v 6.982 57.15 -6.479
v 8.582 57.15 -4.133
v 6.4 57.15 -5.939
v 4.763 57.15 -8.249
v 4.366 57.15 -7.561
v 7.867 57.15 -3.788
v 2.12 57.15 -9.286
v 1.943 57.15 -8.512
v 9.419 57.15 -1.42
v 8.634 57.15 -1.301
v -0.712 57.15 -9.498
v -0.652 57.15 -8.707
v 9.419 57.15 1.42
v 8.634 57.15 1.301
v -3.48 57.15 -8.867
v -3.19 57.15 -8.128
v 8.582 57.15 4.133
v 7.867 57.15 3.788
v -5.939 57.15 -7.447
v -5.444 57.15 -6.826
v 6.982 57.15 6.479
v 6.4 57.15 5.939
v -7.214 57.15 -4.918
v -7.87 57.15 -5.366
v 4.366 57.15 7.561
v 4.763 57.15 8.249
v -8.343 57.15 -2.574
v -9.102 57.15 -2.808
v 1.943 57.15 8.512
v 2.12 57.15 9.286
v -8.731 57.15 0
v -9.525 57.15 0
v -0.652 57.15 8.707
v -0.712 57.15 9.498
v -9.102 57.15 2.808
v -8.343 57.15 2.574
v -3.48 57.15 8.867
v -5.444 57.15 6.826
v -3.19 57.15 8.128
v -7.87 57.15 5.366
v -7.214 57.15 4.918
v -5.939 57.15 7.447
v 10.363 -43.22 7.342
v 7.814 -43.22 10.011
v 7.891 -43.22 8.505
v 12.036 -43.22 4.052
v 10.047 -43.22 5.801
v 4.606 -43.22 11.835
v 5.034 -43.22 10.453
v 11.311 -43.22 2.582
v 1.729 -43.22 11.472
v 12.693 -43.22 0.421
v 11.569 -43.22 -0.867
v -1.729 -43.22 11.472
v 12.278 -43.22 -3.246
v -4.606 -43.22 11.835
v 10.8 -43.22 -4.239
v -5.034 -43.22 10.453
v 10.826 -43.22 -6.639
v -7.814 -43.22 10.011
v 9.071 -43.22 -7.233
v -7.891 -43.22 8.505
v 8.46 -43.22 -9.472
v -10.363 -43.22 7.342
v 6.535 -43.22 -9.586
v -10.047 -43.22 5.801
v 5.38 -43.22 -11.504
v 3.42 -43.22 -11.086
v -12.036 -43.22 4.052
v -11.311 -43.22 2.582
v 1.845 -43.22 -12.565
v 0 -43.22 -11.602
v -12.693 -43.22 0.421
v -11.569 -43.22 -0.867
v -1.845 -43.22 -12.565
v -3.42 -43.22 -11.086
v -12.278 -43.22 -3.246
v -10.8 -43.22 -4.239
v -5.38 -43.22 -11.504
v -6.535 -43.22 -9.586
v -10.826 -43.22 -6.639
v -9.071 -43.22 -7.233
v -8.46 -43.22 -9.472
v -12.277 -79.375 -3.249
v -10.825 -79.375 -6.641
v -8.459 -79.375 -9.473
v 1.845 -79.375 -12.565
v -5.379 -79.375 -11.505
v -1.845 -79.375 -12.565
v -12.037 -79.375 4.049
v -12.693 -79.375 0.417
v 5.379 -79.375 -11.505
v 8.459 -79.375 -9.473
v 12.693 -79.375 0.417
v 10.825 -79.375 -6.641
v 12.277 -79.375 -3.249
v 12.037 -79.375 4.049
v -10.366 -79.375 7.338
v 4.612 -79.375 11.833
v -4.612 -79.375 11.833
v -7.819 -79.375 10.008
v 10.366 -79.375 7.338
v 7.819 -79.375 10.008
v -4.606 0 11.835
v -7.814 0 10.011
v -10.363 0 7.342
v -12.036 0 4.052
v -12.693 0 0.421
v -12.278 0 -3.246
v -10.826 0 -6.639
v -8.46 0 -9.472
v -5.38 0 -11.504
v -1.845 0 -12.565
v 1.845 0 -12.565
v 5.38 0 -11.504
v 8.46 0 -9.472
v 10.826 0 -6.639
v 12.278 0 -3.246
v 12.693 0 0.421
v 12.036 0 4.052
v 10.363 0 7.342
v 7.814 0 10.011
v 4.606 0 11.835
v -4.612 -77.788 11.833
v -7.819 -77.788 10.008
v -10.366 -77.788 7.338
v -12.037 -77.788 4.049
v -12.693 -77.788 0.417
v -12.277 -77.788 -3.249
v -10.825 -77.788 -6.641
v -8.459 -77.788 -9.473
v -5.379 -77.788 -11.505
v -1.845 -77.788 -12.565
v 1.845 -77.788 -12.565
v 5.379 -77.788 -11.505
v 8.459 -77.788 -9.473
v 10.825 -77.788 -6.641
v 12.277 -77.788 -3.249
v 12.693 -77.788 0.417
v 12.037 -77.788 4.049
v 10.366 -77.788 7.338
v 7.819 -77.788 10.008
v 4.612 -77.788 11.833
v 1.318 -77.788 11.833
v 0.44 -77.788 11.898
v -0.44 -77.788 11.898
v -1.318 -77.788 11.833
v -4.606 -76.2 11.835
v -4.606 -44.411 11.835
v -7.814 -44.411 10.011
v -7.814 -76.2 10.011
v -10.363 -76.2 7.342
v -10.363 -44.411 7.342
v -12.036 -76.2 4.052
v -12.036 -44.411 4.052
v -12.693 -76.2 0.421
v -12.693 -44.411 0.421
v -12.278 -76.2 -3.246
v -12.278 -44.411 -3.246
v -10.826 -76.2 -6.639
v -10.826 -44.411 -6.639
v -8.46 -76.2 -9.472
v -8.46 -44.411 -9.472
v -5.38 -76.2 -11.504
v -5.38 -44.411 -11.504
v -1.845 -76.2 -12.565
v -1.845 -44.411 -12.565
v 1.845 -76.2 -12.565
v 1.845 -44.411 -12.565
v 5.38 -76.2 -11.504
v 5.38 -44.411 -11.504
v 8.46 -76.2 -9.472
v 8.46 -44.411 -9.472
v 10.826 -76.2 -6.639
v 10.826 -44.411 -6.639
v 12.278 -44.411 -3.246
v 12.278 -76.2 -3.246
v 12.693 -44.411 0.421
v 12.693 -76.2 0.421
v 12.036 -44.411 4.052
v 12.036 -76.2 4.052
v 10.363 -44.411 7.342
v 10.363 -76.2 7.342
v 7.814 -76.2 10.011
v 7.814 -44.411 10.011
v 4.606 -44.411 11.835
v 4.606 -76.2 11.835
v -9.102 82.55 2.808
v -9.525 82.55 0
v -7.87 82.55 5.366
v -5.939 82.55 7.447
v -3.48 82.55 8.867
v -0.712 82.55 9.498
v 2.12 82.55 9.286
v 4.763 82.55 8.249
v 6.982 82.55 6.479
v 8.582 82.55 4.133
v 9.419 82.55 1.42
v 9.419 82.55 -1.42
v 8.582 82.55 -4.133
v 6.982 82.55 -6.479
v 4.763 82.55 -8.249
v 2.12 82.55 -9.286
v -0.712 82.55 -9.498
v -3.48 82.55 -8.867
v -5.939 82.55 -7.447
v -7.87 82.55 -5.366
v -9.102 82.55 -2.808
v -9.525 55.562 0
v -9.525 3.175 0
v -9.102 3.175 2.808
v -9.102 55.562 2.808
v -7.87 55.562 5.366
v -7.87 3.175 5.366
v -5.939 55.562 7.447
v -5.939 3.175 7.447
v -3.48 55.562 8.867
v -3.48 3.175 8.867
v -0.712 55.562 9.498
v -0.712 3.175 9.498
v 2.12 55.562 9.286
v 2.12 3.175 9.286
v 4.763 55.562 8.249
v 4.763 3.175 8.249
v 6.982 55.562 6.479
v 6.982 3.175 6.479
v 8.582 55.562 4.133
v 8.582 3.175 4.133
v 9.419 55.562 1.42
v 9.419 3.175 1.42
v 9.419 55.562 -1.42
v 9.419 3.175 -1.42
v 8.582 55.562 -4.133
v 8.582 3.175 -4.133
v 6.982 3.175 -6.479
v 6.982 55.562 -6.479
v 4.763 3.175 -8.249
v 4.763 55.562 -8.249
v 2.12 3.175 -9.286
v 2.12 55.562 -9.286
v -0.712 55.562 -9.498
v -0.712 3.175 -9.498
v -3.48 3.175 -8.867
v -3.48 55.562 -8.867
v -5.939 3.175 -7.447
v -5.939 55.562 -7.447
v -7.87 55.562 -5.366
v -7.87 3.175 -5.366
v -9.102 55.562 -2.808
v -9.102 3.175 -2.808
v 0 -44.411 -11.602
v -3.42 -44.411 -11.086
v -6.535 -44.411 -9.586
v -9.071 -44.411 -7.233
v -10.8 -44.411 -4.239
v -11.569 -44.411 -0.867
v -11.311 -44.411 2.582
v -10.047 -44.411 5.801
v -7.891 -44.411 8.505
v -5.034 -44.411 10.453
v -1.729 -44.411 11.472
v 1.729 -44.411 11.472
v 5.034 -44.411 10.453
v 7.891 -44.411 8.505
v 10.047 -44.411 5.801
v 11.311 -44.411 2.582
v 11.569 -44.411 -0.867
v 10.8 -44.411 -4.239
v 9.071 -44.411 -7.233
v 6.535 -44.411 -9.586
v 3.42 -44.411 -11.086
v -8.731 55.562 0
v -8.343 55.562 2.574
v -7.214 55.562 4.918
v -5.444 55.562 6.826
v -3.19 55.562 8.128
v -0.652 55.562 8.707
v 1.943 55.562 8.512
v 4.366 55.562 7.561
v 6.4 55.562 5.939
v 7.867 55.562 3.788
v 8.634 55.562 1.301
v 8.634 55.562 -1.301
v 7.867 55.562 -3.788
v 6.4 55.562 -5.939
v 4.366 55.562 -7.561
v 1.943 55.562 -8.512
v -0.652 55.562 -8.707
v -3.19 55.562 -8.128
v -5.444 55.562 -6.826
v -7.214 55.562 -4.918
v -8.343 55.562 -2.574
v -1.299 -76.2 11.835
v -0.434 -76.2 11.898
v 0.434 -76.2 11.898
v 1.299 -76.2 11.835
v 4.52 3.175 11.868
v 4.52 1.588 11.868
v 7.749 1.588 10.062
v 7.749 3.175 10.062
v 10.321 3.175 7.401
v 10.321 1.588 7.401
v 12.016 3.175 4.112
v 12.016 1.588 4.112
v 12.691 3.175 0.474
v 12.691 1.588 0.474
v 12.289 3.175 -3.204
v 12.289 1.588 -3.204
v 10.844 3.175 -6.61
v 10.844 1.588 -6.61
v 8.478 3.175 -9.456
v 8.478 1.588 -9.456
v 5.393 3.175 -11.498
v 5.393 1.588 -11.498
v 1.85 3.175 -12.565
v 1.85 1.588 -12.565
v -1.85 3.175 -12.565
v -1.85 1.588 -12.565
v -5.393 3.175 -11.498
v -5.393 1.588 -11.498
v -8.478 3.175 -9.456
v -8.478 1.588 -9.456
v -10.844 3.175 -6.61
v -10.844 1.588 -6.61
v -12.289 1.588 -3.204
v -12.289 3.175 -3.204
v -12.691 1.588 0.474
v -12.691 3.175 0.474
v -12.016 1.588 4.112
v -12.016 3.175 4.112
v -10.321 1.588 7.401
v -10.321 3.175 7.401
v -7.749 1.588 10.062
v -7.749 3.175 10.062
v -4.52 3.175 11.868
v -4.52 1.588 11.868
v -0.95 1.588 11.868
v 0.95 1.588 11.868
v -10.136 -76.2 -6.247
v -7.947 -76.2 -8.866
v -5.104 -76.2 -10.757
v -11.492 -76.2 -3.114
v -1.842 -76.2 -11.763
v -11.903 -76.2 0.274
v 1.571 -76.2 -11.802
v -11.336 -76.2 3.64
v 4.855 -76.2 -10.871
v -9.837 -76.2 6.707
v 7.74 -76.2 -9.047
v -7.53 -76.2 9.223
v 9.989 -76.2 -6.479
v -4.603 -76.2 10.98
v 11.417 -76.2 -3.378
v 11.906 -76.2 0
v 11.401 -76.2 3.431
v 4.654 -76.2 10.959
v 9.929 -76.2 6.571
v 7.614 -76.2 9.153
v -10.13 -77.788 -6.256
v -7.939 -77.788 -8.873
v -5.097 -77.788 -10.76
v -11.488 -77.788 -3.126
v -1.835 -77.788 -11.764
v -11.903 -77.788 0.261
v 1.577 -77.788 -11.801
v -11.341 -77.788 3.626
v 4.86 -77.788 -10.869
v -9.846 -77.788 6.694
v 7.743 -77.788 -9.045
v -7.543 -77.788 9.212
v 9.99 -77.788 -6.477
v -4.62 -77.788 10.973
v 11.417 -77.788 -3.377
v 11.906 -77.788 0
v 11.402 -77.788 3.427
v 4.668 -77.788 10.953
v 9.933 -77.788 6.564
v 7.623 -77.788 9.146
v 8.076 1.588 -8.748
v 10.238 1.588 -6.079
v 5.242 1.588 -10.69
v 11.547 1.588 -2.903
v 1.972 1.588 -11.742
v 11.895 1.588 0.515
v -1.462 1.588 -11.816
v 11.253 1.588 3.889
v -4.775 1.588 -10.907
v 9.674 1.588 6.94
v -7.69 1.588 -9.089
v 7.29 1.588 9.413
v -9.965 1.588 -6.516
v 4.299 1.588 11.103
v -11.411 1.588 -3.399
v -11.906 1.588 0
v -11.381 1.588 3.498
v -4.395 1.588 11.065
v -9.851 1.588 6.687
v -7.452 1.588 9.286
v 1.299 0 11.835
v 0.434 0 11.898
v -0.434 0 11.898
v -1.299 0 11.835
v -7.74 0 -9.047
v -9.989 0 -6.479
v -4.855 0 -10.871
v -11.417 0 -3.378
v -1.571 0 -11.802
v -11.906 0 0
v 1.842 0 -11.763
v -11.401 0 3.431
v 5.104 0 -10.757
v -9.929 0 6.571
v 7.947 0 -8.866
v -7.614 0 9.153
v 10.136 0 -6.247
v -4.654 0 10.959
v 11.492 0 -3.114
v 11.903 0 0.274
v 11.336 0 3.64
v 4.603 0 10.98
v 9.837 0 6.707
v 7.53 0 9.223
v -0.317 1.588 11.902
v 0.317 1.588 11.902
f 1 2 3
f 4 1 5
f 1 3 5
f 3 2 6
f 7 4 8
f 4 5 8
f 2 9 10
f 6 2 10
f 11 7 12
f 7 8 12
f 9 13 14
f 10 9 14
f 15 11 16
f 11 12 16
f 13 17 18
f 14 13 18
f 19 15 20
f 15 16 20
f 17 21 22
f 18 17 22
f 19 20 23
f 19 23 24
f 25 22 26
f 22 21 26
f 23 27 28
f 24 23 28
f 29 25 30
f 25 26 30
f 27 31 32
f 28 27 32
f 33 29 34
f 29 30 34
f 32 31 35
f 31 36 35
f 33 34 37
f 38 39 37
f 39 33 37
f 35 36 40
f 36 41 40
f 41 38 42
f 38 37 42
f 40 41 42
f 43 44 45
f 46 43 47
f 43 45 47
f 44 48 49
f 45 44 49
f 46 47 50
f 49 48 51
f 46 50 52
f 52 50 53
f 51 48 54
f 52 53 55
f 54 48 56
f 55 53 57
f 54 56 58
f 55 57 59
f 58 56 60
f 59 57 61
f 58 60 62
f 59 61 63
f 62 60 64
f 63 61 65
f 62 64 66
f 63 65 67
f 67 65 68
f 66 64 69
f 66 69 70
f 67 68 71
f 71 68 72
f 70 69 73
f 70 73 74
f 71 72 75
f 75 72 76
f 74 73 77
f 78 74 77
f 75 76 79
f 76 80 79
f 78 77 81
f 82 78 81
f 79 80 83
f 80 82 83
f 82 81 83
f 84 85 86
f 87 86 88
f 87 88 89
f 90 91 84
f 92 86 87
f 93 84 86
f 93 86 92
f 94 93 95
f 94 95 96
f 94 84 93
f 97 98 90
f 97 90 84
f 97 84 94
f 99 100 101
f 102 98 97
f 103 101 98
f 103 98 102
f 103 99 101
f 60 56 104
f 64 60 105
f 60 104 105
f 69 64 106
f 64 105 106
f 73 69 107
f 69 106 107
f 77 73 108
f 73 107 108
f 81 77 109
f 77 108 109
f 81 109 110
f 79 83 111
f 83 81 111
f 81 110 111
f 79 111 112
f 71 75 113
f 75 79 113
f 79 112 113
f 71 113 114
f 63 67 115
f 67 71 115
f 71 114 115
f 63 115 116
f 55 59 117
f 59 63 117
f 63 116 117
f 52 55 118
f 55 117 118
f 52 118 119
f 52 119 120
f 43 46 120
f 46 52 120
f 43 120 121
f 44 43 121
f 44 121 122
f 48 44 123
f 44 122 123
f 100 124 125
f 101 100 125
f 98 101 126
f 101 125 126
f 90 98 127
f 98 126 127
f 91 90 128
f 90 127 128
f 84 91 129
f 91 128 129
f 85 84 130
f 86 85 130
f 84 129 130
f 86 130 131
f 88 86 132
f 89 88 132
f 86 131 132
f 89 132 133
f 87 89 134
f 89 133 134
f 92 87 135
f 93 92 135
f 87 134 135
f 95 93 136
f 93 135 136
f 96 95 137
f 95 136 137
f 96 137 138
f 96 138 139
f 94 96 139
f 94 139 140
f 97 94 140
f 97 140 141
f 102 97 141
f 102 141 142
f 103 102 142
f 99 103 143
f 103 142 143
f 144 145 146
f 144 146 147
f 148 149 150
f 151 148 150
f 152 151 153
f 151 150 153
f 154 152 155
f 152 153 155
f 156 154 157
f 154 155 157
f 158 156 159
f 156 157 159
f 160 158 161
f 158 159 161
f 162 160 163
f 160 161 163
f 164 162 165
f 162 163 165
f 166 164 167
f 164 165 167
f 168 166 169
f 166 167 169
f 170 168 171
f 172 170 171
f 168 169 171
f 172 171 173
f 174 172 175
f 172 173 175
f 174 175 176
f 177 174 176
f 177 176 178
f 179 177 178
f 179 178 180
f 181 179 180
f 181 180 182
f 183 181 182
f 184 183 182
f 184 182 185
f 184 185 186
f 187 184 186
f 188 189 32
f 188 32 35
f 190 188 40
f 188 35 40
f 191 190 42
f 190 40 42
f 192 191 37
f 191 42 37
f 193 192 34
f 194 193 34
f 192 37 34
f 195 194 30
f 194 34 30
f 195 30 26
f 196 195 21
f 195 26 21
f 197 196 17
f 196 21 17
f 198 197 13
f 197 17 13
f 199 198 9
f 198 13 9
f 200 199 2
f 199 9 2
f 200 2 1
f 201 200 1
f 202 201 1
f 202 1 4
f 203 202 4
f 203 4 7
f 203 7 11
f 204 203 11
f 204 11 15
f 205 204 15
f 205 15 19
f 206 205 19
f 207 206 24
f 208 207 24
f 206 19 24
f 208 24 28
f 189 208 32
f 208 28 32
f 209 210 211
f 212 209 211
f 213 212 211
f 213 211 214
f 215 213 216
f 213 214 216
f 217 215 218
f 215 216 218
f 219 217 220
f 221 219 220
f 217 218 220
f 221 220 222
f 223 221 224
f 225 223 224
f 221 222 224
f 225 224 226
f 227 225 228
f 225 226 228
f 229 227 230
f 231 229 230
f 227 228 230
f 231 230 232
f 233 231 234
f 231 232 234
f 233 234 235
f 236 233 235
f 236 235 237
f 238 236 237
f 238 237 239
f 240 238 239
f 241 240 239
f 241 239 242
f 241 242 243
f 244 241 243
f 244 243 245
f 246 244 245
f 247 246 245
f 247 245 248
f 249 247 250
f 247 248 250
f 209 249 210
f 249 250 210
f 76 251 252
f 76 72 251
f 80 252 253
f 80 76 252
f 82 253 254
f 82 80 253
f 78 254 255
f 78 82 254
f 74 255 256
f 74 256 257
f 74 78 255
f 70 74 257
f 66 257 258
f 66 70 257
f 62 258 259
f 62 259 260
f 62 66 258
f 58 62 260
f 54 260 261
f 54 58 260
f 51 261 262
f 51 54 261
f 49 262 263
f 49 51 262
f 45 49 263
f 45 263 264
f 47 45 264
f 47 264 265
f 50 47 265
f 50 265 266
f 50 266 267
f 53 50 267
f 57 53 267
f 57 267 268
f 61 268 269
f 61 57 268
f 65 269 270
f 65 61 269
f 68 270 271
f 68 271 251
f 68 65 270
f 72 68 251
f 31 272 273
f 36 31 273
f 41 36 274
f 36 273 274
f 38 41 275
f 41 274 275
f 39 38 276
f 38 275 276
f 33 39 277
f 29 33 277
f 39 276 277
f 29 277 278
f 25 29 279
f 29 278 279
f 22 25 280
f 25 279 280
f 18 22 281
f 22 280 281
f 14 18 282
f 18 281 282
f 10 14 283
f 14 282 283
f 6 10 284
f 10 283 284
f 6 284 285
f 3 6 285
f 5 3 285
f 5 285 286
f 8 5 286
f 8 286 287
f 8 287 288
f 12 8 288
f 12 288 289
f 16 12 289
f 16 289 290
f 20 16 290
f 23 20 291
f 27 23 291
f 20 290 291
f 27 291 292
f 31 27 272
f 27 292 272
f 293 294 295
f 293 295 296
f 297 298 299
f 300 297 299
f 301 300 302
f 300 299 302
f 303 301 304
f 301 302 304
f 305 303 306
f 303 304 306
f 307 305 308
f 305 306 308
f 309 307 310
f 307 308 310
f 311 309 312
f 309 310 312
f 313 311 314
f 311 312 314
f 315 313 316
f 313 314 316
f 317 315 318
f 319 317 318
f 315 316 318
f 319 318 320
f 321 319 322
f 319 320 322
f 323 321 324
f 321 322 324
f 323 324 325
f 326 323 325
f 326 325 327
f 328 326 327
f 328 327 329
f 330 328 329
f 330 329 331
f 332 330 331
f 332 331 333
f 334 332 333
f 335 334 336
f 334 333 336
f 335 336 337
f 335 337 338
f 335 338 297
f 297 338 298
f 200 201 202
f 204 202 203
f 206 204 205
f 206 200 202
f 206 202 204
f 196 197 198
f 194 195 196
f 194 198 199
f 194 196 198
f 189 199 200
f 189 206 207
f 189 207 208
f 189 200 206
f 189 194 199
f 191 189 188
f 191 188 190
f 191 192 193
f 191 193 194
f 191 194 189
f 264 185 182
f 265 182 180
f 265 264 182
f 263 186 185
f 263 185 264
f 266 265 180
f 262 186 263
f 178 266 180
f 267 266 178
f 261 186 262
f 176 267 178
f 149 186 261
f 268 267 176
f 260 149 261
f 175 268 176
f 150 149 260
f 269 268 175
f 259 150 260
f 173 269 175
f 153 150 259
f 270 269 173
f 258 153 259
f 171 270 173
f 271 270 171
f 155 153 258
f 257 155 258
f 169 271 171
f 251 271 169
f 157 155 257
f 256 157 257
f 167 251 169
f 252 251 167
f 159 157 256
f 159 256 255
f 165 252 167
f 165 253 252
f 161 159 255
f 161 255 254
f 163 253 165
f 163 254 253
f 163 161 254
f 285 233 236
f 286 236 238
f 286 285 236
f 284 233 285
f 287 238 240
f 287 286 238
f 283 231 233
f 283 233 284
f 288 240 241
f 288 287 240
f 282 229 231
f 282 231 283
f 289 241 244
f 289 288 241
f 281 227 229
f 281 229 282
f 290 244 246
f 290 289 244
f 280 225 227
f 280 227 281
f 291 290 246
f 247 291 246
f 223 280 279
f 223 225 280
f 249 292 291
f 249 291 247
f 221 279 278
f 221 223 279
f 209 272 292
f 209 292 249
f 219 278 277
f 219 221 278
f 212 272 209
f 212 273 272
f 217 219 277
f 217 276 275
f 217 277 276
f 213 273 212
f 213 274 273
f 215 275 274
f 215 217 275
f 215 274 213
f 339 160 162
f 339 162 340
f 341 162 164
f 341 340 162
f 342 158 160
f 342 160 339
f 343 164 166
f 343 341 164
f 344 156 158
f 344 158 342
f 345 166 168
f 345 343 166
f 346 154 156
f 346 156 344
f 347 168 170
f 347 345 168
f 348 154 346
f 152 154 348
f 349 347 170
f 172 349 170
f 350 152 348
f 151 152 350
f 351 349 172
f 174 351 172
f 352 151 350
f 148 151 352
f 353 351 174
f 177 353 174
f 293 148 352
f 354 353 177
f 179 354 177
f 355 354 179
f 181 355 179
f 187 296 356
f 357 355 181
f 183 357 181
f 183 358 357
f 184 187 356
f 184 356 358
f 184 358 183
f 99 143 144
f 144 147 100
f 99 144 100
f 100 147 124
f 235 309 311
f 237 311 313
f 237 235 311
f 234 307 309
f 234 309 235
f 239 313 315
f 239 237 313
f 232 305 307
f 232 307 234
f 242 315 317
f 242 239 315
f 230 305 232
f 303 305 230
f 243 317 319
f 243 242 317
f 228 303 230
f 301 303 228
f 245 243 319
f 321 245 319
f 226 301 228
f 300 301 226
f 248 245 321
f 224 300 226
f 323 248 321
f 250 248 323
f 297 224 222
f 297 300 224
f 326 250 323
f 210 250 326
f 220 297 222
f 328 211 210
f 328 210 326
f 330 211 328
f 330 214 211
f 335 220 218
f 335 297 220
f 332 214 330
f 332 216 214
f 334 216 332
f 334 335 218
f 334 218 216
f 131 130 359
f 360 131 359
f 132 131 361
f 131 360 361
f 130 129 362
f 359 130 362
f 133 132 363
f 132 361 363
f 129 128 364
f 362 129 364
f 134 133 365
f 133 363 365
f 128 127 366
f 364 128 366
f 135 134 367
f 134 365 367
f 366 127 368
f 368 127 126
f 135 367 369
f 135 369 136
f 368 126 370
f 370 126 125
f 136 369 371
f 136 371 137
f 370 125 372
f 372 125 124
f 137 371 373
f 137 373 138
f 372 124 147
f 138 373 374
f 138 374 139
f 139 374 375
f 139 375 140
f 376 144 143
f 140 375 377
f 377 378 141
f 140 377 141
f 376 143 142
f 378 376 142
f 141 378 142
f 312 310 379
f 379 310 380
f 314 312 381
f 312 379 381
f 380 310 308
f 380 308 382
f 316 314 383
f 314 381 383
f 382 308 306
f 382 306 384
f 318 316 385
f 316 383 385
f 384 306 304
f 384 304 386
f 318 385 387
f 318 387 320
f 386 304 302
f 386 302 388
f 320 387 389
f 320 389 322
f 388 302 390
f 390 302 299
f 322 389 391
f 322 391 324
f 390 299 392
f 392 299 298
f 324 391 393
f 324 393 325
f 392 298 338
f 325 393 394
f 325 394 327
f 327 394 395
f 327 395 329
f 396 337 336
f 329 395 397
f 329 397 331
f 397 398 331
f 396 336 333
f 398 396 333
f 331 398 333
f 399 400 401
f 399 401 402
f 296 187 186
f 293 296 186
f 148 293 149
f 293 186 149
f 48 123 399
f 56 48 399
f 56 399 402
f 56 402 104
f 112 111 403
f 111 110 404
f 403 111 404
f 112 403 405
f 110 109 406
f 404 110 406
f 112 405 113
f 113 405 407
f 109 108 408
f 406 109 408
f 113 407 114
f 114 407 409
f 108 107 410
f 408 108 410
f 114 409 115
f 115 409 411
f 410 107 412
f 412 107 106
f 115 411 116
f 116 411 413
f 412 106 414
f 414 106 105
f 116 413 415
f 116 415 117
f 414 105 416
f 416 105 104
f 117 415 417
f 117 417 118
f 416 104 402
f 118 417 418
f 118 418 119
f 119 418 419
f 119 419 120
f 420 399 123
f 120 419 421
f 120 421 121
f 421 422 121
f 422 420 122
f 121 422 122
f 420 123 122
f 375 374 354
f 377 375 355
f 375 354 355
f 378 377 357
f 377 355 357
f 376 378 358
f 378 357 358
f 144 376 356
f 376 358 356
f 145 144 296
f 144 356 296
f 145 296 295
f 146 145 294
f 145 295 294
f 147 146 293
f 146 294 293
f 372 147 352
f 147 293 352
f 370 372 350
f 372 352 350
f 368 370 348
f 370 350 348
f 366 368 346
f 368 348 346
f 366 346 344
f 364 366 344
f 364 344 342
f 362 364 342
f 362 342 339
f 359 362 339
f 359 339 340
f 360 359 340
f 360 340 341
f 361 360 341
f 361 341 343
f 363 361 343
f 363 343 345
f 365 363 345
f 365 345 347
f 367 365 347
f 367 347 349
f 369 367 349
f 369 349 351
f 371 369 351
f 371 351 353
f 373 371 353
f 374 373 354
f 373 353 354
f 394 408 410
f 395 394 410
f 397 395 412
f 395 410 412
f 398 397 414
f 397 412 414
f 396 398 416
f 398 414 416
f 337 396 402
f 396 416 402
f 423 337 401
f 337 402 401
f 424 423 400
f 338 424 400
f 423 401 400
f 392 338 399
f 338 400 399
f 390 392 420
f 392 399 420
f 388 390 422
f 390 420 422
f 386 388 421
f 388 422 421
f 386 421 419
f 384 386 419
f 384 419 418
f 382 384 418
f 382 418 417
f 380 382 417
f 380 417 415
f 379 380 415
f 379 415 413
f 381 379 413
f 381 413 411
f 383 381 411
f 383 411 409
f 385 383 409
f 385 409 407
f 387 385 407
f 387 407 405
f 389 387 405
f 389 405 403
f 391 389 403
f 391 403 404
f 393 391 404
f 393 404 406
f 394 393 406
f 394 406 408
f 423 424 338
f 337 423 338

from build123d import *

# Parameters (mm, degrees)
F1_DEPTH  = 76.2
F2_R      = 11.90625
F3_DEPTH  = 1.5875
F5_DEPTH  = 1.5875
F6_R      = 11.90625
F7_DEPTH  = 1.5875
F9_DEPTH  = 1.5875
F10_R     = 9.525
F11_DEPTH = 52.3875
F12_R     = 8.73125
F13_DEPTH = 1.5875
F14_R     = 9.525
F15_DEPTH = 25.4
F16_W     = 1.190625
F16_H     = 1.190625


with BuildPart() as f1:
    # F0 (on Front) → F1 (new body)
    with BuildSketch(Plane.XZ):
        with BuildLine():
            Line((4.6062404769, 11.83522491), (-4.6062404769, 11.83522491))
            ThreePointArc((-4.6062404769, 11.83522491), (0, -12.7), (4.6062404769, 11.83522491))
        make_face()
    extrude(amount=F1_DEPTH)

    # F2 (on face) → F3 (join)
    with BuildSketch(Plane.XZ.offset(76.2)):
        Circle(F2_R)
    extrude(amount=F3_DEPTH)

    # F4 (on face) → F5 (join)
    with BuildSketch(Plane.XZ.offset(77.7875)):
        with BuildLine():
            Line((4.6117921338, 11.8330627191), (-4.6117921338, 11.8330627191))
            ThreePointArc((-4.6117921338, 11.8330627191), (0, -12.7), (4.6117921338, 11.8330627191))
        make_face()
    extrude(amount=F5_DEPTH)

    # F6 (on face) → F7 (join)
    with BuildSketch(Plane(origin=(0, 0, 0), x_dir=(-1, 0, 0), z_dir=(0, 1, 0))):
        Circle(F6_R)
    extrude(amount=F7_DEPTH)

    # F8 (on face) → F9 (join)
    with BuildSketch(Plane(origin=(0, 1.5875, 0), x_dir=(-1, 0, 0), z_dir=(0, 1, 0))):
        with BuildLine():
            Line((4.5204102672, 11.8682724529), (-4.5204102672, 11.8682724529))
            ThreePointArc((-4.5204102672, 11.8682724529), (0, -12.7), (4.5204102672, 11.8682724529))
        make_face()
    extrude(amount=F9_DEPTH)

    # F10 (on face) → F11 (join)
    with BuildSketch(Plane(origin=(0, 3.175, 0), x_dir=(-1, 0, 0), z_dir=(0, 1, 0))):
        Circle(F10_R)
    extrude(amount=F11_DEPTH)

    # F12 (on face) → F13 (join)
    with BuildSketch(Plane(origin=(0, 55.5625, 0), x_dir=(-1, 0, 0), z_dir=(0, 1, 0))):
        Circle(F12_R)
    extrude(amount=F13_DEPTH)

    # F14 (on face) → F15 (join)
    with BuildSketch(Plane(origin=(0, 57.15, 0), x_dir=(-1, 0, 0), z_dir=(0, 1, 0))):
        Circle(F14_R)
    extrude(amount=F15_DEPTH)

    # F16 (on Right) → F17 (revolve, cut)
    with BuildSketch(Plane.YZ):
        with Locations((-43.8153046727, -12.1969180837)):
            Rectangle(F16_W, F16_H)
    revolve(axis=Axis((0, 0, 0), (0, 1, 0)), mode=Mode.SUBTRACT)


solid = f1.part
